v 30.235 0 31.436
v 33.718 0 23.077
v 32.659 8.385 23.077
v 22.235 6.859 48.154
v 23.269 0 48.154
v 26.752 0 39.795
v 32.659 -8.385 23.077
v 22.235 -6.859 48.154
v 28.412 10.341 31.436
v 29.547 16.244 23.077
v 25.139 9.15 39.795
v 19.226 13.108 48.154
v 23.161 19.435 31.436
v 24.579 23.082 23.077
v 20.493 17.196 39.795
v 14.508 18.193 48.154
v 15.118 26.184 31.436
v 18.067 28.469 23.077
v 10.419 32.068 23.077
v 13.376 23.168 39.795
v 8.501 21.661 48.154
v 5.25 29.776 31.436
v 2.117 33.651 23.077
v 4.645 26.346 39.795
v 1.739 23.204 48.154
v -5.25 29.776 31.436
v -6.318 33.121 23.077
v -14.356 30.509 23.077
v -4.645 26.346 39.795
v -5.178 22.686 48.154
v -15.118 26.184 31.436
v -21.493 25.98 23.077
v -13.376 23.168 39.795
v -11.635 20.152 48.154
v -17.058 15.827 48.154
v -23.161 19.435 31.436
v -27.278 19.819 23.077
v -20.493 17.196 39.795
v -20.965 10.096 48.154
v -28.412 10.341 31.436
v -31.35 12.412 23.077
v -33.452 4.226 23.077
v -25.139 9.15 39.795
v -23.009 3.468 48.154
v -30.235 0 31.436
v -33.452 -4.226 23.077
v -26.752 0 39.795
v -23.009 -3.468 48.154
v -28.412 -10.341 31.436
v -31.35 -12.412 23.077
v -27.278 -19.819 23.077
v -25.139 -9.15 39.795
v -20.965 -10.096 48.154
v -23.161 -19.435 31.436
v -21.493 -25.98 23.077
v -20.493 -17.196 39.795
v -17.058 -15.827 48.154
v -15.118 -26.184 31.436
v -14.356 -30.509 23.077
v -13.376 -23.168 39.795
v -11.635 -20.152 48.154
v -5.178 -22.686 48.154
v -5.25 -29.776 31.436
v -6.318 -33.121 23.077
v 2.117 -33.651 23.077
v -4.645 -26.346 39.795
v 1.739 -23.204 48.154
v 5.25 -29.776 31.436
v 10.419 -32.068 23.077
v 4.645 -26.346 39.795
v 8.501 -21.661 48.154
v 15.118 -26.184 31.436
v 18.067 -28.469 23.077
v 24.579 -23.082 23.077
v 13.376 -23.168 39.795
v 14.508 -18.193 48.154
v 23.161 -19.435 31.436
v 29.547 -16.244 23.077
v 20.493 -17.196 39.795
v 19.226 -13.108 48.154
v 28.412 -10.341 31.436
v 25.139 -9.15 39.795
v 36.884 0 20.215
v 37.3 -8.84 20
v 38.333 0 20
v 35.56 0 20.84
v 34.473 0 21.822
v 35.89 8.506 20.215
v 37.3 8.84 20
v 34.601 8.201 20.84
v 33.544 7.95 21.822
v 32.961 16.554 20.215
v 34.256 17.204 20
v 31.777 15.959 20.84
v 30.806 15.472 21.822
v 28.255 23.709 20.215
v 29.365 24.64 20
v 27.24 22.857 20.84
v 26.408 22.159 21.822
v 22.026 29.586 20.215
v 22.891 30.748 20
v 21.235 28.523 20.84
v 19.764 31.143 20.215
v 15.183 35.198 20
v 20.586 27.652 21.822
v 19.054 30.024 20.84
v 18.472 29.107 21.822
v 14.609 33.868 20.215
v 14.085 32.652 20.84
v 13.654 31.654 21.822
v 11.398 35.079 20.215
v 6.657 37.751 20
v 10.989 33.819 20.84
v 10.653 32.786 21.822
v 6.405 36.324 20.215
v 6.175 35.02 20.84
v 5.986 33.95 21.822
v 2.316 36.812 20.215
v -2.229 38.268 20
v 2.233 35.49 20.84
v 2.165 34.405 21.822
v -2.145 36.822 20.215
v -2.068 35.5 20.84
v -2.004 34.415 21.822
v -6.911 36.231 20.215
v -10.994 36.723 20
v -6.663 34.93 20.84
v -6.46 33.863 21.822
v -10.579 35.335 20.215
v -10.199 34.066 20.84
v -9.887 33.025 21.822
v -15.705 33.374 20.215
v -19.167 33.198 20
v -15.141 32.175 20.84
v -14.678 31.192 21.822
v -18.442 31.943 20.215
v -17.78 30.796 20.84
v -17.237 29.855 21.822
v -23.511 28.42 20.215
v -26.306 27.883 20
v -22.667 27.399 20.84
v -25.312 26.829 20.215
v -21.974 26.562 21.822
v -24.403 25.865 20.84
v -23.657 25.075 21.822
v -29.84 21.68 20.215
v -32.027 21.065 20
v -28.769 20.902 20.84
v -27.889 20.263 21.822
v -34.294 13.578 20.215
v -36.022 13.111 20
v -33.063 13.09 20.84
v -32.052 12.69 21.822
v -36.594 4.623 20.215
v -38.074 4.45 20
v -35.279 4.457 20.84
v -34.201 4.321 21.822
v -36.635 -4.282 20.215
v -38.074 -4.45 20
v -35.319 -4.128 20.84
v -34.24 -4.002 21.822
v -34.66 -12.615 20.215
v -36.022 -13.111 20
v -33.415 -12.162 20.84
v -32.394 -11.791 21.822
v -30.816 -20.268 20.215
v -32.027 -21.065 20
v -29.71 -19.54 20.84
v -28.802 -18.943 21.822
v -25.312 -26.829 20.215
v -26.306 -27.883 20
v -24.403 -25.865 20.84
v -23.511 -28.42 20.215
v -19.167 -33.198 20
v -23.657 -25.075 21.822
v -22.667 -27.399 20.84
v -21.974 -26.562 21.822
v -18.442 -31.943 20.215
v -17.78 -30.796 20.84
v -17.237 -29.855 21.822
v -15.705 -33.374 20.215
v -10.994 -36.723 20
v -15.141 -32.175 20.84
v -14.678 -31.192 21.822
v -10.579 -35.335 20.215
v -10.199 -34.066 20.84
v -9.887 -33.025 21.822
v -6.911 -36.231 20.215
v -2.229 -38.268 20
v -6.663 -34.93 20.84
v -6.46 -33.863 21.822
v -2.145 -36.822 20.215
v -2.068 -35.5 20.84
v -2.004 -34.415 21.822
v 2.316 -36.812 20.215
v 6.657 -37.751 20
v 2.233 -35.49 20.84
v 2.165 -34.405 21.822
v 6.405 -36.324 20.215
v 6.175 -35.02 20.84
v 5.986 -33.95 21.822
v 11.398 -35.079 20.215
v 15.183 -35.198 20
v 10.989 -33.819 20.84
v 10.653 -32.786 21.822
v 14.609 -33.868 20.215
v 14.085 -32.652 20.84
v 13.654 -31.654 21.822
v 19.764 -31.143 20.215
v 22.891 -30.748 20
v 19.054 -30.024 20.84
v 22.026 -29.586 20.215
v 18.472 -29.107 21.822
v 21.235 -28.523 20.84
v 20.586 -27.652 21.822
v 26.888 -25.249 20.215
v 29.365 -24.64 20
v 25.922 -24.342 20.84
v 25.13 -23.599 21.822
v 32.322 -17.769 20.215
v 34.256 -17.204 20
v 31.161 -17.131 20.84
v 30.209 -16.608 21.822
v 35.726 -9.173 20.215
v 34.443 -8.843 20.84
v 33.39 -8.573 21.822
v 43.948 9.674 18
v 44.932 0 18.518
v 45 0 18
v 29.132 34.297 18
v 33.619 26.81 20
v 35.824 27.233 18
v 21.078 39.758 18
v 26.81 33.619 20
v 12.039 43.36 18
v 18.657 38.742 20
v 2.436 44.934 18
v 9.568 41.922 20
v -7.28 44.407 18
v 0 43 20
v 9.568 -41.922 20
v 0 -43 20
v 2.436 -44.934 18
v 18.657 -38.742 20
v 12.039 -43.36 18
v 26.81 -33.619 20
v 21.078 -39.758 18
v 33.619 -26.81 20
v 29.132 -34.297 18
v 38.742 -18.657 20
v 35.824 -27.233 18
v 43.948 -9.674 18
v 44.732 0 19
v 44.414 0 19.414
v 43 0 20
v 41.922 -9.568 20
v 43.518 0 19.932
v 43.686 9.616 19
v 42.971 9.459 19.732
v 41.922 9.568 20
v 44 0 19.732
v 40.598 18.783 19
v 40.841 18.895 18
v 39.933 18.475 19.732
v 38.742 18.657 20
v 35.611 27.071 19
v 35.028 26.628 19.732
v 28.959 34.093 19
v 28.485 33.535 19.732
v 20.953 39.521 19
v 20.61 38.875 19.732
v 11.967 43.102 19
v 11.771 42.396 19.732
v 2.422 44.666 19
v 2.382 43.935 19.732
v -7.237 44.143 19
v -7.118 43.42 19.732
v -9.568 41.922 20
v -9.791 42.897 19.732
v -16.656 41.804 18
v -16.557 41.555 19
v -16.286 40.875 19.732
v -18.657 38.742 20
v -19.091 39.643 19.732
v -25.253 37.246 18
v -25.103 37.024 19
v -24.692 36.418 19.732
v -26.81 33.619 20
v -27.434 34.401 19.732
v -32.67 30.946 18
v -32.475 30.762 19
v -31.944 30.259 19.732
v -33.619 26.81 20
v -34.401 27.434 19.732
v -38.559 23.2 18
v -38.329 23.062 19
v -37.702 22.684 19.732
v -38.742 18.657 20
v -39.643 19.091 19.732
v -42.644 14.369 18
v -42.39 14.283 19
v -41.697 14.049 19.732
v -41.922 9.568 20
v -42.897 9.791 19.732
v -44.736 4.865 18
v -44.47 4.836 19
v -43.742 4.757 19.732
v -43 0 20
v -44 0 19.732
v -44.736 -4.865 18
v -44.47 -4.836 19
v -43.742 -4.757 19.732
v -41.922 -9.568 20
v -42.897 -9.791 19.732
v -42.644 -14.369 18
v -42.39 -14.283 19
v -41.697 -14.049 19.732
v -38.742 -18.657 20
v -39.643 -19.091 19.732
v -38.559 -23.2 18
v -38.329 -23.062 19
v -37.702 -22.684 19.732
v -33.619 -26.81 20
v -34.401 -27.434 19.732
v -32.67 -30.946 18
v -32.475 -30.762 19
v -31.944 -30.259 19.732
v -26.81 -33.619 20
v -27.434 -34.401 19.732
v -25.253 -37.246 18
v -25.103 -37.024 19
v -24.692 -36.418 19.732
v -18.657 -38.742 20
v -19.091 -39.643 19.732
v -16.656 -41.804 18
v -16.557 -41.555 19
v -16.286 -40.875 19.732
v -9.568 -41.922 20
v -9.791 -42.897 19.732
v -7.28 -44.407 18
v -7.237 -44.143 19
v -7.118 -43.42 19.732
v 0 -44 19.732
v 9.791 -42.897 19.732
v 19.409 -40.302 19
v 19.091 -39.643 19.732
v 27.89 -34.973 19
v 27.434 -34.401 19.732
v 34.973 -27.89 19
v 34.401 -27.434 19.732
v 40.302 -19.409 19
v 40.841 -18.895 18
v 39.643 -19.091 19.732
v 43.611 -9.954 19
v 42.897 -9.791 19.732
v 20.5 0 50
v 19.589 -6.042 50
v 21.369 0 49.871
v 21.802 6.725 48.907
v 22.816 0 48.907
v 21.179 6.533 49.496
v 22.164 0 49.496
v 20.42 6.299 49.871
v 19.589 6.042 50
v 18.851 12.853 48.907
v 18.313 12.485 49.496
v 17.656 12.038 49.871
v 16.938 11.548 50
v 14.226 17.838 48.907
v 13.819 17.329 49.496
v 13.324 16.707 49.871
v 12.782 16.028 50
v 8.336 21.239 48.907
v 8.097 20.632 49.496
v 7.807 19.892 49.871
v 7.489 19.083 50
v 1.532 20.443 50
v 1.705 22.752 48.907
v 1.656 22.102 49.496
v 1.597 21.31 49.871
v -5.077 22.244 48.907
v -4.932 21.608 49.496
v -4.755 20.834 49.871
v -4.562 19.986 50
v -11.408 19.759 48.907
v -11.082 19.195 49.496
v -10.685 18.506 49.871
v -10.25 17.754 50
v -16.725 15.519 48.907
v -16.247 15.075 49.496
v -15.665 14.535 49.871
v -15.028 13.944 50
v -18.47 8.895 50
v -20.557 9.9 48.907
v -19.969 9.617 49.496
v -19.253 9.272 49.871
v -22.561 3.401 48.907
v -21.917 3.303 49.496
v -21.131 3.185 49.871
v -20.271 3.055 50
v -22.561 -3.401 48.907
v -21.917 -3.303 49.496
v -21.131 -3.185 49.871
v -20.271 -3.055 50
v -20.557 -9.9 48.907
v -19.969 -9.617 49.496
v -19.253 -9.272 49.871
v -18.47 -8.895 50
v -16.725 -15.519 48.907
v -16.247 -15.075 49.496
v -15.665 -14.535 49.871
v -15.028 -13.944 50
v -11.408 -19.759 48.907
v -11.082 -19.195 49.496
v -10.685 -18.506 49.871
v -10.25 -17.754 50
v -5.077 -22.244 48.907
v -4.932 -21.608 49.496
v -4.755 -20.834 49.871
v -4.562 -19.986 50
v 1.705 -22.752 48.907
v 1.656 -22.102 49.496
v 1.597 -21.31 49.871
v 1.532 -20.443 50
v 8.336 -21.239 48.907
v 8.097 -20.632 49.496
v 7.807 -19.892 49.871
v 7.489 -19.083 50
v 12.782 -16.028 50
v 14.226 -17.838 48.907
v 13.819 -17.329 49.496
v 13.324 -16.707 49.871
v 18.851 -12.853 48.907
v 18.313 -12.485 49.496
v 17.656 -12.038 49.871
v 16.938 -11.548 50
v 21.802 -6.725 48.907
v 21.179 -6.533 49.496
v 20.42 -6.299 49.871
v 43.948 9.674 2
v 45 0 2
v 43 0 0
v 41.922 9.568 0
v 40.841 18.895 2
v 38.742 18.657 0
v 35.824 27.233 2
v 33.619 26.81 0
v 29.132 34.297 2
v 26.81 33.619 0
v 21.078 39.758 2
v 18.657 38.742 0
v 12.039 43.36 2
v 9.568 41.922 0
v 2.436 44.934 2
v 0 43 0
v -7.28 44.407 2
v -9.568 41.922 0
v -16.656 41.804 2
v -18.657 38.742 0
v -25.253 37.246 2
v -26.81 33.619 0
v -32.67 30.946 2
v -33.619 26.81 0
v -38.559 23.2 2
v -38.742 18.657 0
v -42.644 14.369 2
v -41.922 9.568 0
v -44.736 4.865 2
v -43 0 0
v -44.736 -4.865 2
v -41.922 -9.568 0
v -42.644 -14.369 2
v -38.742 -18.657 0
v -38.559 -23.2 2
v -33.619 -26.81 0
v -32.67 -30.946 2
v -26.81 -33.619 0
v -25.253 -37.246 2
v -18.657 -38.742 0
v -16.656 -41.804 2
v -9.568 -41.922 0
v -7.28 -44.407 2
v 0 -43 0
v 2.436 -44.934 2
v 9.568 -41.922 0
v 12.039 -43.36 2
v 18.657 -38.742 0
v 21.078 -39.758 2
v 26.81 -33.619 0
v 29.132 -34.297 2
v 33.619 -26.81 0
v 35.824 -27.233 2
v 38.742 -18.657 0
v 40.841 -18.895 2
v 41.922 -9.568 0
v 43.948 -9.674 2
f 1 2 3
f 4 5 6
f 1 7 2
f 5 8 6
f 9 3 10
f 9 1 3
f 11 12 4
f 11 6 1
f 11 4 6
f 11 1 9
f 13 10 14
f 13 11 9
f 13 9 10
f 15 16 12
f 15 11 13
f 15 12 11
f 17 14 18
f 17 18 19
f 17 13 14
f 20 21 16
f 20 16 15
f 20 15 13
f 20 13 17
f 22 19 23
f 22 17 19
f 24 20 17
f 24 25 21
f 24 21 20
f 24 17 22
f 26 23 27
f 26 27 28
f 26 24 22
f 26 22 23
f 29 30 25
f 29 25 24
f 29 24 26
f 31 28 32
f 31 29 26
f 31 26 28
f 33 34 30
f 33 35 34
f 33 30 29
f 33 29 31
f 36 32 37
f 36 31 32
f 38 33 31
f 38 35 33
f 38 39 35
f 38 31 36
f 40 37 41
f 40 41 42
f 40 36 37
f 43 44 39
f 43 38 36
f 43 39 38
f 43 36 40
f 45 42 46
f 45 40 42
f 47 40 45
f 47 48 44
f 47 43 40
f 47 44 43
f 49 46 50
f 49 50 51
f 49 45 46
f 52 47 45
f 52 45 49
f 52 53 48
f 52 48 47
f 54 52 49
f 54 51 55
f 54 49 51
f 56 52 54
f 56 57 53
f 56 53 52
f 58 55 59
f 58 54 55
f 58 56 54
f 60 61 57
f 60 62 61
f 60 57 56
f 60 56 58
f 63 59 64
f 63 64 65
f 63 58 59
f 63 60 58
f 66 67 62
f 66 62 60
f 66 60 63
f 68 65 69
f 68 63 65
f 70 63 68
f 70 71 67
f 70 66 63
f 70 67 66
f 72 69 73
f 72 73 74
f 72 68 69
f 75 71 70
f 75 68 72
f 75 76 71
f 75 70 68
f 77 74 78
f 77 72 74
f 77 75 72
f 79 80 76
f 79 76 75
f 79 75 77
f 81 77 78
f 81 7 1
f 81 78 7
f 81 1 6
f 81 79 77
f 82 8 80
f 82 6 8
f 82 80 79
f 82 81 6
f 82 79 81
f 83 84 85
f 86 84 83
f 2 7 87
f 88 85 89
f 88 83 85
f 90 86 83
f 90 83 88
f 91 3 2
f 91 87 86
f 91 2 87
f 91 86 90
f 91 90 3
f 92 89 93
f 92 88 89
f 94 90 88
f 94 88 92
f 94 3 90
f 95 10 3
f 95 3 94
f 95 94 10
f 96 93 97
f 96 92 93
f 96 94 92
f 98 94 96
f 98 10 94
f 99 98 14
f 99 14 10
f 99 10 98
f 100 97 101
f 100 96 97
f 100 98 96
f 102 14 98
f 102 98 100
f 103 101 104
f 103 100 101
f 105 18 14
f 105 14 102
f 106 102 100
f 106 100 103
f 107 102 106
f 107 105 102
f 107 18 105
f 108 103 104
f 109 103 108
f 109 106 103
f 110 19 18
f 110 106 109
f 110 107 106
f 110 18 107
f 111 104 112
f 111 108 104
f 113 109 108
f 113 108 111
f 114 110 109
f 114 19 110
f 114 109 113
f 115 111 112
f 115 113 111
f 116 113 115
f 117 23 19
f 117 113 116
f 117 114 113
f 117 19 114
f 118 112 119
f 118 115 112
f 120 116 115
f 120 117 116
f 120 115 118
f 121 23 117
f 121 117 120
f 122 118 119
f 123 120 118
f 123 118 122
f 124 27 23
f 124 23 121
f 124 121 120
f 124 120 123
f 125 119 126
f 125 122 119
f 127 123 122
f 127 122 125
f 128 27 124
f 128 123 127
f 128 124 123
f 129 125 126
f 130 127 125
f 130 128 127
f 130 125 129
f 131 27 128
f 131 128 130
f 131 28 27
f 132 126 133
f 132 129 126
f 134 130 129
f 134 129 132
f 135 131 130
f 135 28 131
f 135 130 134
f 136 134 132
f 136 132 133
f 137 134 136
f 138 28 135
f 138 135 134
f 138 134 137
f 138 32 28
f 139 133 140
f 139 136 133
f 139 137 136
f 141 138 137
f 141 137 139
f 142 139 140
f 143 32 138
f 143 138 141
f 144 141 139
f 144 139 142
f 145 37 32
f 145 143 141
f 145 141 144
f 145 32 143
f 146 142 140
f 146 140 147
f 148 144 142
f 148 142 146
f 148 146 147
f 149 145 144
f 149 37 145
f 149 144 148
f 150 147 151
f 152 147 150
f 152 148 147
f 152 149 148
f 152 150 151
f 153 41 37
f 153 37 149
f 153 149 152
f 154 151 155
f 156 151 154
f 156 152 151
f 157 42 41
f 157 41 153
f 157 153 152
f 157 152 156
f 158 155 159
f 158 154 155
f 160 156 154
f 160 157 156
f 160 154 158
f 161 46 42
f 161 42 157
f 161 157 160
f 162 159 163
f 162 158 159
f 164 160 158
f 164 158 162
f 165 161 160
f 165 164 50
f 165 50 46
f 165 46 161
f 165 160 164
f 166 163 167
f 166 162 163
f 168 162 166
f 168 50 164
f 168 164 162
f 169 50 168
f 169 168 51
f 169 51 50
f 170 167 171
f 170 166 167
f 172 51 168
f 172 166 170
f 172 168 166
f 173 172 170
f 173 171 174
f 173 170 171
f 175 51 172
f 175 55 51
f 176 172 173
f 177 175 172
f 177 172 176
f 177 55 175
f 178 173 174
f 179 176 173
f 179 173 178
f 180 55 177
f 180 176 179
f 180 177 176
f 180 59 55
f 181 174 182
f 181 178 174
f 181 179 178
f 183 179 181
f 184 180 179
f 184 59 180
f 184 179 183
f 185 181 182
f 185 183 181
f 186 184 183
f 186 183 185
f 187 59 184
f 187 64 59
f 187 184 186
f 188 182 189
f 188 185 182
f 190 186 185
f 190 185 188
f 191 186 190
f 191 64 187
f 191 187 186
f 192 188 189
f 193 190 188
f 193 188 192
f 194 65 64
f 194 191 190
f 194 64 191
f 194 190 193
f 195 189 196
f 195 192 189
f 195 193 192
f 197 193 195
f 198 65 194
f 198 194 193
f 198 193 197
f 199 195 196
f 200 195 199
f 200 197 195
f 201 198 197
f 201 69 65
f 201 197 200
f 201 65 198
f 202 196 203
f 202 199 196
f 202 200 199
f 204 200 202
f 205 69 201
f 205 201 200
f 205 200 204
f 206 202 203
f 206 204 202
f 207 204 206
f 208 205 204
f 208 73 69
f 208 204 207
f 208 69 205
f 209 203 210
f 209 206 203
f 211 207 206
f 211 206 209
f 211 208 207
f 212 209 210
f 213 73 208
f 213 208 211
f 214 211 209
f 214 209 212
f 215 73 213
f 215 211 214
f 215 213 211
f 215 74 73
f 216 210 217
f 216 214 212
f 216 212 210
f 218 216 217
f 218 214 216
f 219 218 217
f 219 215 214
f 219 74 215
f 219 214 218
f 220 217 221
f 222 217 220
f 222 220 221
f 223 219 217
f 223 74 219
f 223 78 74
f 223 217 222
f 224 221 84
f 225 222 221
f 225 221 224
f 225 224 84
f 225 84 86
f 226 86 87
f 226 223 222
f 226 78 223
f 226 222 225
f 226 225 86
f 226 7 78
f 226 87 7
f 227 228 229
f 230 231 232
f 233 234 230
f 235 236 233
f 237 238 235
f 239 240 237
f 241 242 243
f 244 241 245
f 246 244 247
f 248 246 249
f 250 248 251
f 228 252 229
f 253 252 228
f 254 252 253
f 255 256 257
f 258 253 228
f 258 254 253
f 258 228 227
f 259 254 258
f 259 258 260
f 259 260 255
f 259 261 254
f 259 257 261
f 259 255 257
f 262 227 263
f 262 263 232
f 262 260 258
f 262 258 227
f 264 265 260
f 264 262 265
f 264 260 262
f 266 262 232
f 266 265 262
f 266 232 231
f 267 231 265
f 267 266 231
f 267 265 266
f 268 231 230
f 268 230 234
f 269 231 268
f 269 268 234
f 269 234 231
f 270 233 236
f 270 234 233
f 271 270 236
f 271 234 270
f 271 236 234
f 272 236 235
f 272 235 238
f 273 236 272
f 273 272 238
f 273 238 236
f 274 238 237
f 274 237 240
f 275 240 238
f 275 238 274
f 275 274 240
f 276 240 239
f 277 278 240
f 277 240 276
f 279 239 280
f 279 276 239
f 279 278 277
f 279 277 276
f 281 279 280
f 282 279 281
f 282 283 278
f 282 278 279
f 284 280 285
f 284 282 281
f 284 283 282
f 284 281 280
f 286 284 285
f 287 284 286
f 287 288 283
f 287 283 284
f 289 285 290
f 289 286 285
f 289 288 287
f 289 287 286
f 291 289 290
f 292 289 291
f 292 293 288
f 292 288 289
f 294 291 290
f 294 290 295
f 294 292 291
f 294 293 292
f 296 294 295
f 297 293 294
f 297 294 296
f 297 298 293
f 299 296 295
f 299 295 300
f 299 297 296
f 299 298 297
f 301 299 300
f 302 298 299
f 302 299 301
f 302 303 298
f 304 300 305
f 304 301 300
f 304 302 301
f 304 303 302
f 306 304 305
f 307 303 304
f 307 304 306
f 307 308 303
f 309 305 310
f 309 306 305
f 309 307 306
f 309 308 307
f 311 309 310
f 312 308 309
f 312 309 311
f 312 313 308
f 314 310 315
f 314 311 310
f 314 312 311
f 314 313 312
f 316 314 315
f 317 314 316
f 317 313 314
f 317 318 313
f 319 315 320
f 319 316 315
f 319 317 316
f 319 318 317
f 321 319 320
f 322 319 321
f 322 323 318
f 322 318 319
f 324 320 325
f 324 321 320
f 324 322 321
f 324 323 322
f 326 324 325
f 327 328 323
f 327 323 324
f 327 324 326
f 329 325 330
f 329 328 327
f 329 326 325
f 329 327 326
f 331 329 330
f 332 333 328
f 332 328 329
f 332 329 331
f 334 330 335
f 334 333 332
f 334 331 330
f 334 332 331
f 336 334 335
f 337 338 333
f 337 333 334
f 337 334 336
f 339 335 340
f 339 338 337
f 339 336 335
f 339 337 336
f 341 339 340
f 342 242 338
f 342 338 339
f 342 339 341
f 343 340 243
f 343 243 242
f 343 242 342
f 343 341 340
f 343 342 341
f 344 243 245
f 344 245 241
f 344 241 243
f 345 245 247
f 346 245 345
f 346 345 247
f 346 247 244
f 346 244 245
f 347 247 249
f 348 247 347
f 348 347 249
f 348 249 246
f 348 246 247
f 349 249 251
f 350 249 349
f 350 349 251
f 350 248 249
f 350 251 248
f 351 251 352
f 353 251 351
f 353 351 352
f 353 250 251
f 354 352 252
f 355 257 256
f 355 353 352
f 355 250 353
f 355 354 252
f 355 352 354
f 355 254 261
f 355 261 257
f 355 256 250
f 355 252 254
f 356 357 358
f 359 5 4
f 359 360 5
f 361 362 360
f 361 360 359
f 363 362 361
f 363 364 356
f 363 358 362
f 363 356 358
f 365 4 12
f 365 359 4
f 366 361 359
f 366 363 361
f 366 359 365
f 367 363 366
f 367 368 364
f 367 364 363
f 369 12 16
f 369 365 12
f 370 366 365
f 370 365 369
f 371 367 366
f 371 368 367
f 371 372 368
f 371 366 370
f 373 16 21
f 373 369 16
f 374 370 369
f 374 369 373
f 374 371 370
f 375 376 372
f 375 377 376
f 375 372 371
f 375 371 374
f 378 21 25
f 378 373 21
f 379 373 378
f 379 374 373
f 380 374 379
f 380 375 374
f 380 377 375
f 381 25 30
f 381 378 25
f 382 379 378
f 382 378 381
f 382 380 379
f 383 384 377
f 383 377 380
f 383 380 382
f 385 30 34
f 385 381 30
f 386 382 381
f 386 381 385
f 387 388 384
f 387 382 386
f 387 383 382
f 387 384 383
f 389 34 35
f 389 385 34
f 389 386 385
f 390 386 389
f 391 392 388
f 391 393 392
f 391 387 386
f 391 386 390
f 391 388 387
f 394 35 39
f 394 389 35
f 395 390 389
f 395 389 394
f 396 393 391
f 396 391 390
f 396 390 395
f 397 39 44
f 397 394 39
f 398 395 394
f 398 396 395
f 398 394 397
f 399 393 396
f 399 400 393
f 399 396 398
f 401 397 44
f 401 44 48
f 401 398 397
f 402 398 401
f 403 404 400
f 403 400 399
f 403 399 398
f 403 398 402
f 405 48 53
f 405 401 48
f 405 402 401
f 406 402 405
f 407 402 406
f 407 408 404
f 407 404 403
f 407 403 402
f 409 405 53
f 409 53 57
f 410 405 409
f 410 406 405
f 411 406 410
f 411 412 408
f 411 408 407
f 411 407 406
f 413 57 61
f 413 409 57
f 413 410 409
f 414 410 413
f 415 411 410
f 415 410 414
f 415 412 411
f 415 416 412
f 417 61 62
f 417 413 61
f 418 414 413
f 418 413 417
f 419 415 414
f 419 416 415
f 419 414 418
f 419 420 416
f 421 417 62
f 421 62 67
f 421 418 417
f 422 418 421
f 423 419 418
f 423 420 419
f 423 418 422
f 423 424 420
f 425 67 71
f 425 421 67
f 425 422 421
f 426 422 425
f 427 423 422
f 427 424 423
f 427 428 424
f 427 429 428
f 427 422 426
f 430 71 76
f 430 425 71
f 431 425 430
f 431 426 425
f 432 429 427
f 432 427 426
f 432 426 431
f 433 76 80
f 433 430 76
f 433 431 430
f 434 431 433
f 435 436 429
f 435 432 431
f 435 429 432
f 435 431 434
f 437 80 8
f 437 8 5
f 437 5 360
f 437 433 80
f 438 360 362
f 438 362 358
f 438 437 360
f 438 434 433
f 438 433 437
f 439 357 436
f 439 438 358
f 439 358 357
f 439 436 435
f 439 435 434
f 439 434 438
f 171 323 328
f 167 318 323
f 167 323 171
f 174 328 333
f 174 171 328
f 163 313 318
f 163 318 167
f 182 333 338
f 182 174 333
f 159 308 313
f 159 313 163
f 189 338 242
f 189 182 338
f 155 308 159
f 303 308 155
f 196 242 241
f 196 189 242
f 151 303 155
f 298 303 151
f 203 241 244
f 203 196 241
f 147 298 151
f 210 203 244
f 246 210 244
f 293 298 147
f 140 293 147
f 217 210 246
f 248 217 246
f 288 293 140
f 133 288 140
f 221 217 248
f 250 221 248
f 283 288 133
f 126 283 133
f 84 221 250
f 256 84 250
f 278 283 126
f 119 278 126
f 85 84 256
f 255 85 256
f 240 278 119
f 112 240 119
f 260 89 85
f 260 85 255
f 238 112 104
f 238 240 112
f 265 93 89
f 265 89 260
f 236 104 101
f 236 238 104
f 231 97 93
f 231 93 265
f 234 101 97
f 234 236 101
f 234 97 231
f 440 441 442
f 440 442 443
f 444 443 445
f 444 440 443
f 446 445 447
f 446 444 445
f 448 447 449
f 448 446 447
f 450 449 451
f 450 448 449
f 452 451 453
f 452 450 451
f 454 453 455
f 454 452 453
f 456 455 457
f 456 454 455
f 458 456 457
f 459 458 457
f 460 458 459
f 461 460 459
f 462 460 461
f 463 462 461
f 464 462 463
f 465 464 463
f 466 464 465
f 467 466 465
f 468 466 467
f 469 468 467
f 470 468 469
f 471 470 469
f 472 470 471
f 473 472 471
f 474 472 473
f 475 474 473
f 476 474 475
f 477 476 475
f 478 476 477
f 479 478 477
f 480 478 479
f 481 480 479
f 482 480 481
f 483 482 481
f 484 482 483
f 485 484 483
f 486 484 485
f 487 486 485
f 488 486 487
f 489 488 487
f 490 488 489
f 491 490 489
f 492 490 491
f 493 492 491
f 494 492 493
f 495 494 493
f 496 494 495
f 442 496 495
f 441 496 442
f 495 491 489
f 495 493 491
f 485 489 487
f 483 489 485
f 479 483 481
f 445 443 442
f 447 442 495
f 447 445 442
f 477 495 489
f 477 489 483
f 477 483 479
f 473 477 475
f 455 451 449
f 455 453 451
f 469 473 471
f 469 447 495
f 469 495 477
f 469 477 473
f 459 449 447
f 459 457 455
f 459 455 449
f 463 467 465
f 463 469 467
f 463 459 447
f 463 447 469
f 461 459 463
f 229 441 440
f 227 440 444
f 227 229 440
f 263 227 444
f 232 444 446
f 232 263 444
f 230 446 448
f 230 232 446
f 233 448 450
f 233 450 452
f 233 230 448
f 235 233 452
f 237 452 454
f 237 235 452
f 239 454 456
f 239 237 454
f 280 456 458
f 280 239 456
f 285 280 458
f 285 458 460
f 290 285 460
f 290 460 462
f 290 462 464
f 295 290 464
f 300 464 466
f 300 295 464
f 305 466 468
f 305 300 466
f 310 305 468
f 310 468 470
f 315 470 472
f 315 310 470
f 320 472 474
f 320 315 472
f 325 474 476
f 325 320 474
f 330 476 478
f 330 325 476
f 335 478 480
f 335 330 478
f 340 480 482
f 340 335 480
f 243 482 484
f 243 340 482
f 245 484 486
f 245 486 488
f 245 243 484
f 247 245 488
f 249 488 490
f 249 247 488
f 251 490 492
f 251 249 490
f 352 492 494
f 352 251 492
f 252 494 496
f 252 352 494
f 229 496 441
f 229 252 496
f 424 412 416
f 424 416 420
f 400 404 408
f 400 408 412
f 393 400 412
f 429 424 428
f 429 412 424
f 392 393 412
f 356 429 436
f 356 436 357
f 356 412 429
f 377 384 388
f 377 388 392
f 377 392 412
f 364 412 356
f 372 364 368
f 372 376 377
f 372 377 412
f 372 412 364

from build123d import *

# Parameters (mm, degrees)
F2_SIZE = 2


with BuildPart() as f1:
    # F0 (on Front) → F1 (revolve)
    with BuildSketch(Plane.XZ):
        with BuildLine():
            Line((20.5, 50), (0, 50))
            Line((0, 50), (0, 0))
            Line((0, 0), (45, 0))
            Line((45, 0), (45, 18))
            ThreePointArc((45, 18), (44.414214, 19.414214), (43, 20))
            Line((43, 20), (38.333333, 20))
            ThreePointArc((38.333333, 20), (35.559832, 20.839749), (33.717949, 23.076923))
            Line((33.717949, 23.076923), (23.269231, 48.153846))
            ThreePointArc((23.269231, 48.153846), (22.164101, 49.496151), (20.5, 50))
        make_face()
    revolve(axis=Axis((0, 0, 16.569998), (0, 0, 1)))

    # F2
    f2_edges = [f1.edges().sort_by_distance(p)[0] for p in [
        (-45, 0, 0),
    ]]
    chamfer(f2_edges, length=F2_SIZE)


solid = f1.part
